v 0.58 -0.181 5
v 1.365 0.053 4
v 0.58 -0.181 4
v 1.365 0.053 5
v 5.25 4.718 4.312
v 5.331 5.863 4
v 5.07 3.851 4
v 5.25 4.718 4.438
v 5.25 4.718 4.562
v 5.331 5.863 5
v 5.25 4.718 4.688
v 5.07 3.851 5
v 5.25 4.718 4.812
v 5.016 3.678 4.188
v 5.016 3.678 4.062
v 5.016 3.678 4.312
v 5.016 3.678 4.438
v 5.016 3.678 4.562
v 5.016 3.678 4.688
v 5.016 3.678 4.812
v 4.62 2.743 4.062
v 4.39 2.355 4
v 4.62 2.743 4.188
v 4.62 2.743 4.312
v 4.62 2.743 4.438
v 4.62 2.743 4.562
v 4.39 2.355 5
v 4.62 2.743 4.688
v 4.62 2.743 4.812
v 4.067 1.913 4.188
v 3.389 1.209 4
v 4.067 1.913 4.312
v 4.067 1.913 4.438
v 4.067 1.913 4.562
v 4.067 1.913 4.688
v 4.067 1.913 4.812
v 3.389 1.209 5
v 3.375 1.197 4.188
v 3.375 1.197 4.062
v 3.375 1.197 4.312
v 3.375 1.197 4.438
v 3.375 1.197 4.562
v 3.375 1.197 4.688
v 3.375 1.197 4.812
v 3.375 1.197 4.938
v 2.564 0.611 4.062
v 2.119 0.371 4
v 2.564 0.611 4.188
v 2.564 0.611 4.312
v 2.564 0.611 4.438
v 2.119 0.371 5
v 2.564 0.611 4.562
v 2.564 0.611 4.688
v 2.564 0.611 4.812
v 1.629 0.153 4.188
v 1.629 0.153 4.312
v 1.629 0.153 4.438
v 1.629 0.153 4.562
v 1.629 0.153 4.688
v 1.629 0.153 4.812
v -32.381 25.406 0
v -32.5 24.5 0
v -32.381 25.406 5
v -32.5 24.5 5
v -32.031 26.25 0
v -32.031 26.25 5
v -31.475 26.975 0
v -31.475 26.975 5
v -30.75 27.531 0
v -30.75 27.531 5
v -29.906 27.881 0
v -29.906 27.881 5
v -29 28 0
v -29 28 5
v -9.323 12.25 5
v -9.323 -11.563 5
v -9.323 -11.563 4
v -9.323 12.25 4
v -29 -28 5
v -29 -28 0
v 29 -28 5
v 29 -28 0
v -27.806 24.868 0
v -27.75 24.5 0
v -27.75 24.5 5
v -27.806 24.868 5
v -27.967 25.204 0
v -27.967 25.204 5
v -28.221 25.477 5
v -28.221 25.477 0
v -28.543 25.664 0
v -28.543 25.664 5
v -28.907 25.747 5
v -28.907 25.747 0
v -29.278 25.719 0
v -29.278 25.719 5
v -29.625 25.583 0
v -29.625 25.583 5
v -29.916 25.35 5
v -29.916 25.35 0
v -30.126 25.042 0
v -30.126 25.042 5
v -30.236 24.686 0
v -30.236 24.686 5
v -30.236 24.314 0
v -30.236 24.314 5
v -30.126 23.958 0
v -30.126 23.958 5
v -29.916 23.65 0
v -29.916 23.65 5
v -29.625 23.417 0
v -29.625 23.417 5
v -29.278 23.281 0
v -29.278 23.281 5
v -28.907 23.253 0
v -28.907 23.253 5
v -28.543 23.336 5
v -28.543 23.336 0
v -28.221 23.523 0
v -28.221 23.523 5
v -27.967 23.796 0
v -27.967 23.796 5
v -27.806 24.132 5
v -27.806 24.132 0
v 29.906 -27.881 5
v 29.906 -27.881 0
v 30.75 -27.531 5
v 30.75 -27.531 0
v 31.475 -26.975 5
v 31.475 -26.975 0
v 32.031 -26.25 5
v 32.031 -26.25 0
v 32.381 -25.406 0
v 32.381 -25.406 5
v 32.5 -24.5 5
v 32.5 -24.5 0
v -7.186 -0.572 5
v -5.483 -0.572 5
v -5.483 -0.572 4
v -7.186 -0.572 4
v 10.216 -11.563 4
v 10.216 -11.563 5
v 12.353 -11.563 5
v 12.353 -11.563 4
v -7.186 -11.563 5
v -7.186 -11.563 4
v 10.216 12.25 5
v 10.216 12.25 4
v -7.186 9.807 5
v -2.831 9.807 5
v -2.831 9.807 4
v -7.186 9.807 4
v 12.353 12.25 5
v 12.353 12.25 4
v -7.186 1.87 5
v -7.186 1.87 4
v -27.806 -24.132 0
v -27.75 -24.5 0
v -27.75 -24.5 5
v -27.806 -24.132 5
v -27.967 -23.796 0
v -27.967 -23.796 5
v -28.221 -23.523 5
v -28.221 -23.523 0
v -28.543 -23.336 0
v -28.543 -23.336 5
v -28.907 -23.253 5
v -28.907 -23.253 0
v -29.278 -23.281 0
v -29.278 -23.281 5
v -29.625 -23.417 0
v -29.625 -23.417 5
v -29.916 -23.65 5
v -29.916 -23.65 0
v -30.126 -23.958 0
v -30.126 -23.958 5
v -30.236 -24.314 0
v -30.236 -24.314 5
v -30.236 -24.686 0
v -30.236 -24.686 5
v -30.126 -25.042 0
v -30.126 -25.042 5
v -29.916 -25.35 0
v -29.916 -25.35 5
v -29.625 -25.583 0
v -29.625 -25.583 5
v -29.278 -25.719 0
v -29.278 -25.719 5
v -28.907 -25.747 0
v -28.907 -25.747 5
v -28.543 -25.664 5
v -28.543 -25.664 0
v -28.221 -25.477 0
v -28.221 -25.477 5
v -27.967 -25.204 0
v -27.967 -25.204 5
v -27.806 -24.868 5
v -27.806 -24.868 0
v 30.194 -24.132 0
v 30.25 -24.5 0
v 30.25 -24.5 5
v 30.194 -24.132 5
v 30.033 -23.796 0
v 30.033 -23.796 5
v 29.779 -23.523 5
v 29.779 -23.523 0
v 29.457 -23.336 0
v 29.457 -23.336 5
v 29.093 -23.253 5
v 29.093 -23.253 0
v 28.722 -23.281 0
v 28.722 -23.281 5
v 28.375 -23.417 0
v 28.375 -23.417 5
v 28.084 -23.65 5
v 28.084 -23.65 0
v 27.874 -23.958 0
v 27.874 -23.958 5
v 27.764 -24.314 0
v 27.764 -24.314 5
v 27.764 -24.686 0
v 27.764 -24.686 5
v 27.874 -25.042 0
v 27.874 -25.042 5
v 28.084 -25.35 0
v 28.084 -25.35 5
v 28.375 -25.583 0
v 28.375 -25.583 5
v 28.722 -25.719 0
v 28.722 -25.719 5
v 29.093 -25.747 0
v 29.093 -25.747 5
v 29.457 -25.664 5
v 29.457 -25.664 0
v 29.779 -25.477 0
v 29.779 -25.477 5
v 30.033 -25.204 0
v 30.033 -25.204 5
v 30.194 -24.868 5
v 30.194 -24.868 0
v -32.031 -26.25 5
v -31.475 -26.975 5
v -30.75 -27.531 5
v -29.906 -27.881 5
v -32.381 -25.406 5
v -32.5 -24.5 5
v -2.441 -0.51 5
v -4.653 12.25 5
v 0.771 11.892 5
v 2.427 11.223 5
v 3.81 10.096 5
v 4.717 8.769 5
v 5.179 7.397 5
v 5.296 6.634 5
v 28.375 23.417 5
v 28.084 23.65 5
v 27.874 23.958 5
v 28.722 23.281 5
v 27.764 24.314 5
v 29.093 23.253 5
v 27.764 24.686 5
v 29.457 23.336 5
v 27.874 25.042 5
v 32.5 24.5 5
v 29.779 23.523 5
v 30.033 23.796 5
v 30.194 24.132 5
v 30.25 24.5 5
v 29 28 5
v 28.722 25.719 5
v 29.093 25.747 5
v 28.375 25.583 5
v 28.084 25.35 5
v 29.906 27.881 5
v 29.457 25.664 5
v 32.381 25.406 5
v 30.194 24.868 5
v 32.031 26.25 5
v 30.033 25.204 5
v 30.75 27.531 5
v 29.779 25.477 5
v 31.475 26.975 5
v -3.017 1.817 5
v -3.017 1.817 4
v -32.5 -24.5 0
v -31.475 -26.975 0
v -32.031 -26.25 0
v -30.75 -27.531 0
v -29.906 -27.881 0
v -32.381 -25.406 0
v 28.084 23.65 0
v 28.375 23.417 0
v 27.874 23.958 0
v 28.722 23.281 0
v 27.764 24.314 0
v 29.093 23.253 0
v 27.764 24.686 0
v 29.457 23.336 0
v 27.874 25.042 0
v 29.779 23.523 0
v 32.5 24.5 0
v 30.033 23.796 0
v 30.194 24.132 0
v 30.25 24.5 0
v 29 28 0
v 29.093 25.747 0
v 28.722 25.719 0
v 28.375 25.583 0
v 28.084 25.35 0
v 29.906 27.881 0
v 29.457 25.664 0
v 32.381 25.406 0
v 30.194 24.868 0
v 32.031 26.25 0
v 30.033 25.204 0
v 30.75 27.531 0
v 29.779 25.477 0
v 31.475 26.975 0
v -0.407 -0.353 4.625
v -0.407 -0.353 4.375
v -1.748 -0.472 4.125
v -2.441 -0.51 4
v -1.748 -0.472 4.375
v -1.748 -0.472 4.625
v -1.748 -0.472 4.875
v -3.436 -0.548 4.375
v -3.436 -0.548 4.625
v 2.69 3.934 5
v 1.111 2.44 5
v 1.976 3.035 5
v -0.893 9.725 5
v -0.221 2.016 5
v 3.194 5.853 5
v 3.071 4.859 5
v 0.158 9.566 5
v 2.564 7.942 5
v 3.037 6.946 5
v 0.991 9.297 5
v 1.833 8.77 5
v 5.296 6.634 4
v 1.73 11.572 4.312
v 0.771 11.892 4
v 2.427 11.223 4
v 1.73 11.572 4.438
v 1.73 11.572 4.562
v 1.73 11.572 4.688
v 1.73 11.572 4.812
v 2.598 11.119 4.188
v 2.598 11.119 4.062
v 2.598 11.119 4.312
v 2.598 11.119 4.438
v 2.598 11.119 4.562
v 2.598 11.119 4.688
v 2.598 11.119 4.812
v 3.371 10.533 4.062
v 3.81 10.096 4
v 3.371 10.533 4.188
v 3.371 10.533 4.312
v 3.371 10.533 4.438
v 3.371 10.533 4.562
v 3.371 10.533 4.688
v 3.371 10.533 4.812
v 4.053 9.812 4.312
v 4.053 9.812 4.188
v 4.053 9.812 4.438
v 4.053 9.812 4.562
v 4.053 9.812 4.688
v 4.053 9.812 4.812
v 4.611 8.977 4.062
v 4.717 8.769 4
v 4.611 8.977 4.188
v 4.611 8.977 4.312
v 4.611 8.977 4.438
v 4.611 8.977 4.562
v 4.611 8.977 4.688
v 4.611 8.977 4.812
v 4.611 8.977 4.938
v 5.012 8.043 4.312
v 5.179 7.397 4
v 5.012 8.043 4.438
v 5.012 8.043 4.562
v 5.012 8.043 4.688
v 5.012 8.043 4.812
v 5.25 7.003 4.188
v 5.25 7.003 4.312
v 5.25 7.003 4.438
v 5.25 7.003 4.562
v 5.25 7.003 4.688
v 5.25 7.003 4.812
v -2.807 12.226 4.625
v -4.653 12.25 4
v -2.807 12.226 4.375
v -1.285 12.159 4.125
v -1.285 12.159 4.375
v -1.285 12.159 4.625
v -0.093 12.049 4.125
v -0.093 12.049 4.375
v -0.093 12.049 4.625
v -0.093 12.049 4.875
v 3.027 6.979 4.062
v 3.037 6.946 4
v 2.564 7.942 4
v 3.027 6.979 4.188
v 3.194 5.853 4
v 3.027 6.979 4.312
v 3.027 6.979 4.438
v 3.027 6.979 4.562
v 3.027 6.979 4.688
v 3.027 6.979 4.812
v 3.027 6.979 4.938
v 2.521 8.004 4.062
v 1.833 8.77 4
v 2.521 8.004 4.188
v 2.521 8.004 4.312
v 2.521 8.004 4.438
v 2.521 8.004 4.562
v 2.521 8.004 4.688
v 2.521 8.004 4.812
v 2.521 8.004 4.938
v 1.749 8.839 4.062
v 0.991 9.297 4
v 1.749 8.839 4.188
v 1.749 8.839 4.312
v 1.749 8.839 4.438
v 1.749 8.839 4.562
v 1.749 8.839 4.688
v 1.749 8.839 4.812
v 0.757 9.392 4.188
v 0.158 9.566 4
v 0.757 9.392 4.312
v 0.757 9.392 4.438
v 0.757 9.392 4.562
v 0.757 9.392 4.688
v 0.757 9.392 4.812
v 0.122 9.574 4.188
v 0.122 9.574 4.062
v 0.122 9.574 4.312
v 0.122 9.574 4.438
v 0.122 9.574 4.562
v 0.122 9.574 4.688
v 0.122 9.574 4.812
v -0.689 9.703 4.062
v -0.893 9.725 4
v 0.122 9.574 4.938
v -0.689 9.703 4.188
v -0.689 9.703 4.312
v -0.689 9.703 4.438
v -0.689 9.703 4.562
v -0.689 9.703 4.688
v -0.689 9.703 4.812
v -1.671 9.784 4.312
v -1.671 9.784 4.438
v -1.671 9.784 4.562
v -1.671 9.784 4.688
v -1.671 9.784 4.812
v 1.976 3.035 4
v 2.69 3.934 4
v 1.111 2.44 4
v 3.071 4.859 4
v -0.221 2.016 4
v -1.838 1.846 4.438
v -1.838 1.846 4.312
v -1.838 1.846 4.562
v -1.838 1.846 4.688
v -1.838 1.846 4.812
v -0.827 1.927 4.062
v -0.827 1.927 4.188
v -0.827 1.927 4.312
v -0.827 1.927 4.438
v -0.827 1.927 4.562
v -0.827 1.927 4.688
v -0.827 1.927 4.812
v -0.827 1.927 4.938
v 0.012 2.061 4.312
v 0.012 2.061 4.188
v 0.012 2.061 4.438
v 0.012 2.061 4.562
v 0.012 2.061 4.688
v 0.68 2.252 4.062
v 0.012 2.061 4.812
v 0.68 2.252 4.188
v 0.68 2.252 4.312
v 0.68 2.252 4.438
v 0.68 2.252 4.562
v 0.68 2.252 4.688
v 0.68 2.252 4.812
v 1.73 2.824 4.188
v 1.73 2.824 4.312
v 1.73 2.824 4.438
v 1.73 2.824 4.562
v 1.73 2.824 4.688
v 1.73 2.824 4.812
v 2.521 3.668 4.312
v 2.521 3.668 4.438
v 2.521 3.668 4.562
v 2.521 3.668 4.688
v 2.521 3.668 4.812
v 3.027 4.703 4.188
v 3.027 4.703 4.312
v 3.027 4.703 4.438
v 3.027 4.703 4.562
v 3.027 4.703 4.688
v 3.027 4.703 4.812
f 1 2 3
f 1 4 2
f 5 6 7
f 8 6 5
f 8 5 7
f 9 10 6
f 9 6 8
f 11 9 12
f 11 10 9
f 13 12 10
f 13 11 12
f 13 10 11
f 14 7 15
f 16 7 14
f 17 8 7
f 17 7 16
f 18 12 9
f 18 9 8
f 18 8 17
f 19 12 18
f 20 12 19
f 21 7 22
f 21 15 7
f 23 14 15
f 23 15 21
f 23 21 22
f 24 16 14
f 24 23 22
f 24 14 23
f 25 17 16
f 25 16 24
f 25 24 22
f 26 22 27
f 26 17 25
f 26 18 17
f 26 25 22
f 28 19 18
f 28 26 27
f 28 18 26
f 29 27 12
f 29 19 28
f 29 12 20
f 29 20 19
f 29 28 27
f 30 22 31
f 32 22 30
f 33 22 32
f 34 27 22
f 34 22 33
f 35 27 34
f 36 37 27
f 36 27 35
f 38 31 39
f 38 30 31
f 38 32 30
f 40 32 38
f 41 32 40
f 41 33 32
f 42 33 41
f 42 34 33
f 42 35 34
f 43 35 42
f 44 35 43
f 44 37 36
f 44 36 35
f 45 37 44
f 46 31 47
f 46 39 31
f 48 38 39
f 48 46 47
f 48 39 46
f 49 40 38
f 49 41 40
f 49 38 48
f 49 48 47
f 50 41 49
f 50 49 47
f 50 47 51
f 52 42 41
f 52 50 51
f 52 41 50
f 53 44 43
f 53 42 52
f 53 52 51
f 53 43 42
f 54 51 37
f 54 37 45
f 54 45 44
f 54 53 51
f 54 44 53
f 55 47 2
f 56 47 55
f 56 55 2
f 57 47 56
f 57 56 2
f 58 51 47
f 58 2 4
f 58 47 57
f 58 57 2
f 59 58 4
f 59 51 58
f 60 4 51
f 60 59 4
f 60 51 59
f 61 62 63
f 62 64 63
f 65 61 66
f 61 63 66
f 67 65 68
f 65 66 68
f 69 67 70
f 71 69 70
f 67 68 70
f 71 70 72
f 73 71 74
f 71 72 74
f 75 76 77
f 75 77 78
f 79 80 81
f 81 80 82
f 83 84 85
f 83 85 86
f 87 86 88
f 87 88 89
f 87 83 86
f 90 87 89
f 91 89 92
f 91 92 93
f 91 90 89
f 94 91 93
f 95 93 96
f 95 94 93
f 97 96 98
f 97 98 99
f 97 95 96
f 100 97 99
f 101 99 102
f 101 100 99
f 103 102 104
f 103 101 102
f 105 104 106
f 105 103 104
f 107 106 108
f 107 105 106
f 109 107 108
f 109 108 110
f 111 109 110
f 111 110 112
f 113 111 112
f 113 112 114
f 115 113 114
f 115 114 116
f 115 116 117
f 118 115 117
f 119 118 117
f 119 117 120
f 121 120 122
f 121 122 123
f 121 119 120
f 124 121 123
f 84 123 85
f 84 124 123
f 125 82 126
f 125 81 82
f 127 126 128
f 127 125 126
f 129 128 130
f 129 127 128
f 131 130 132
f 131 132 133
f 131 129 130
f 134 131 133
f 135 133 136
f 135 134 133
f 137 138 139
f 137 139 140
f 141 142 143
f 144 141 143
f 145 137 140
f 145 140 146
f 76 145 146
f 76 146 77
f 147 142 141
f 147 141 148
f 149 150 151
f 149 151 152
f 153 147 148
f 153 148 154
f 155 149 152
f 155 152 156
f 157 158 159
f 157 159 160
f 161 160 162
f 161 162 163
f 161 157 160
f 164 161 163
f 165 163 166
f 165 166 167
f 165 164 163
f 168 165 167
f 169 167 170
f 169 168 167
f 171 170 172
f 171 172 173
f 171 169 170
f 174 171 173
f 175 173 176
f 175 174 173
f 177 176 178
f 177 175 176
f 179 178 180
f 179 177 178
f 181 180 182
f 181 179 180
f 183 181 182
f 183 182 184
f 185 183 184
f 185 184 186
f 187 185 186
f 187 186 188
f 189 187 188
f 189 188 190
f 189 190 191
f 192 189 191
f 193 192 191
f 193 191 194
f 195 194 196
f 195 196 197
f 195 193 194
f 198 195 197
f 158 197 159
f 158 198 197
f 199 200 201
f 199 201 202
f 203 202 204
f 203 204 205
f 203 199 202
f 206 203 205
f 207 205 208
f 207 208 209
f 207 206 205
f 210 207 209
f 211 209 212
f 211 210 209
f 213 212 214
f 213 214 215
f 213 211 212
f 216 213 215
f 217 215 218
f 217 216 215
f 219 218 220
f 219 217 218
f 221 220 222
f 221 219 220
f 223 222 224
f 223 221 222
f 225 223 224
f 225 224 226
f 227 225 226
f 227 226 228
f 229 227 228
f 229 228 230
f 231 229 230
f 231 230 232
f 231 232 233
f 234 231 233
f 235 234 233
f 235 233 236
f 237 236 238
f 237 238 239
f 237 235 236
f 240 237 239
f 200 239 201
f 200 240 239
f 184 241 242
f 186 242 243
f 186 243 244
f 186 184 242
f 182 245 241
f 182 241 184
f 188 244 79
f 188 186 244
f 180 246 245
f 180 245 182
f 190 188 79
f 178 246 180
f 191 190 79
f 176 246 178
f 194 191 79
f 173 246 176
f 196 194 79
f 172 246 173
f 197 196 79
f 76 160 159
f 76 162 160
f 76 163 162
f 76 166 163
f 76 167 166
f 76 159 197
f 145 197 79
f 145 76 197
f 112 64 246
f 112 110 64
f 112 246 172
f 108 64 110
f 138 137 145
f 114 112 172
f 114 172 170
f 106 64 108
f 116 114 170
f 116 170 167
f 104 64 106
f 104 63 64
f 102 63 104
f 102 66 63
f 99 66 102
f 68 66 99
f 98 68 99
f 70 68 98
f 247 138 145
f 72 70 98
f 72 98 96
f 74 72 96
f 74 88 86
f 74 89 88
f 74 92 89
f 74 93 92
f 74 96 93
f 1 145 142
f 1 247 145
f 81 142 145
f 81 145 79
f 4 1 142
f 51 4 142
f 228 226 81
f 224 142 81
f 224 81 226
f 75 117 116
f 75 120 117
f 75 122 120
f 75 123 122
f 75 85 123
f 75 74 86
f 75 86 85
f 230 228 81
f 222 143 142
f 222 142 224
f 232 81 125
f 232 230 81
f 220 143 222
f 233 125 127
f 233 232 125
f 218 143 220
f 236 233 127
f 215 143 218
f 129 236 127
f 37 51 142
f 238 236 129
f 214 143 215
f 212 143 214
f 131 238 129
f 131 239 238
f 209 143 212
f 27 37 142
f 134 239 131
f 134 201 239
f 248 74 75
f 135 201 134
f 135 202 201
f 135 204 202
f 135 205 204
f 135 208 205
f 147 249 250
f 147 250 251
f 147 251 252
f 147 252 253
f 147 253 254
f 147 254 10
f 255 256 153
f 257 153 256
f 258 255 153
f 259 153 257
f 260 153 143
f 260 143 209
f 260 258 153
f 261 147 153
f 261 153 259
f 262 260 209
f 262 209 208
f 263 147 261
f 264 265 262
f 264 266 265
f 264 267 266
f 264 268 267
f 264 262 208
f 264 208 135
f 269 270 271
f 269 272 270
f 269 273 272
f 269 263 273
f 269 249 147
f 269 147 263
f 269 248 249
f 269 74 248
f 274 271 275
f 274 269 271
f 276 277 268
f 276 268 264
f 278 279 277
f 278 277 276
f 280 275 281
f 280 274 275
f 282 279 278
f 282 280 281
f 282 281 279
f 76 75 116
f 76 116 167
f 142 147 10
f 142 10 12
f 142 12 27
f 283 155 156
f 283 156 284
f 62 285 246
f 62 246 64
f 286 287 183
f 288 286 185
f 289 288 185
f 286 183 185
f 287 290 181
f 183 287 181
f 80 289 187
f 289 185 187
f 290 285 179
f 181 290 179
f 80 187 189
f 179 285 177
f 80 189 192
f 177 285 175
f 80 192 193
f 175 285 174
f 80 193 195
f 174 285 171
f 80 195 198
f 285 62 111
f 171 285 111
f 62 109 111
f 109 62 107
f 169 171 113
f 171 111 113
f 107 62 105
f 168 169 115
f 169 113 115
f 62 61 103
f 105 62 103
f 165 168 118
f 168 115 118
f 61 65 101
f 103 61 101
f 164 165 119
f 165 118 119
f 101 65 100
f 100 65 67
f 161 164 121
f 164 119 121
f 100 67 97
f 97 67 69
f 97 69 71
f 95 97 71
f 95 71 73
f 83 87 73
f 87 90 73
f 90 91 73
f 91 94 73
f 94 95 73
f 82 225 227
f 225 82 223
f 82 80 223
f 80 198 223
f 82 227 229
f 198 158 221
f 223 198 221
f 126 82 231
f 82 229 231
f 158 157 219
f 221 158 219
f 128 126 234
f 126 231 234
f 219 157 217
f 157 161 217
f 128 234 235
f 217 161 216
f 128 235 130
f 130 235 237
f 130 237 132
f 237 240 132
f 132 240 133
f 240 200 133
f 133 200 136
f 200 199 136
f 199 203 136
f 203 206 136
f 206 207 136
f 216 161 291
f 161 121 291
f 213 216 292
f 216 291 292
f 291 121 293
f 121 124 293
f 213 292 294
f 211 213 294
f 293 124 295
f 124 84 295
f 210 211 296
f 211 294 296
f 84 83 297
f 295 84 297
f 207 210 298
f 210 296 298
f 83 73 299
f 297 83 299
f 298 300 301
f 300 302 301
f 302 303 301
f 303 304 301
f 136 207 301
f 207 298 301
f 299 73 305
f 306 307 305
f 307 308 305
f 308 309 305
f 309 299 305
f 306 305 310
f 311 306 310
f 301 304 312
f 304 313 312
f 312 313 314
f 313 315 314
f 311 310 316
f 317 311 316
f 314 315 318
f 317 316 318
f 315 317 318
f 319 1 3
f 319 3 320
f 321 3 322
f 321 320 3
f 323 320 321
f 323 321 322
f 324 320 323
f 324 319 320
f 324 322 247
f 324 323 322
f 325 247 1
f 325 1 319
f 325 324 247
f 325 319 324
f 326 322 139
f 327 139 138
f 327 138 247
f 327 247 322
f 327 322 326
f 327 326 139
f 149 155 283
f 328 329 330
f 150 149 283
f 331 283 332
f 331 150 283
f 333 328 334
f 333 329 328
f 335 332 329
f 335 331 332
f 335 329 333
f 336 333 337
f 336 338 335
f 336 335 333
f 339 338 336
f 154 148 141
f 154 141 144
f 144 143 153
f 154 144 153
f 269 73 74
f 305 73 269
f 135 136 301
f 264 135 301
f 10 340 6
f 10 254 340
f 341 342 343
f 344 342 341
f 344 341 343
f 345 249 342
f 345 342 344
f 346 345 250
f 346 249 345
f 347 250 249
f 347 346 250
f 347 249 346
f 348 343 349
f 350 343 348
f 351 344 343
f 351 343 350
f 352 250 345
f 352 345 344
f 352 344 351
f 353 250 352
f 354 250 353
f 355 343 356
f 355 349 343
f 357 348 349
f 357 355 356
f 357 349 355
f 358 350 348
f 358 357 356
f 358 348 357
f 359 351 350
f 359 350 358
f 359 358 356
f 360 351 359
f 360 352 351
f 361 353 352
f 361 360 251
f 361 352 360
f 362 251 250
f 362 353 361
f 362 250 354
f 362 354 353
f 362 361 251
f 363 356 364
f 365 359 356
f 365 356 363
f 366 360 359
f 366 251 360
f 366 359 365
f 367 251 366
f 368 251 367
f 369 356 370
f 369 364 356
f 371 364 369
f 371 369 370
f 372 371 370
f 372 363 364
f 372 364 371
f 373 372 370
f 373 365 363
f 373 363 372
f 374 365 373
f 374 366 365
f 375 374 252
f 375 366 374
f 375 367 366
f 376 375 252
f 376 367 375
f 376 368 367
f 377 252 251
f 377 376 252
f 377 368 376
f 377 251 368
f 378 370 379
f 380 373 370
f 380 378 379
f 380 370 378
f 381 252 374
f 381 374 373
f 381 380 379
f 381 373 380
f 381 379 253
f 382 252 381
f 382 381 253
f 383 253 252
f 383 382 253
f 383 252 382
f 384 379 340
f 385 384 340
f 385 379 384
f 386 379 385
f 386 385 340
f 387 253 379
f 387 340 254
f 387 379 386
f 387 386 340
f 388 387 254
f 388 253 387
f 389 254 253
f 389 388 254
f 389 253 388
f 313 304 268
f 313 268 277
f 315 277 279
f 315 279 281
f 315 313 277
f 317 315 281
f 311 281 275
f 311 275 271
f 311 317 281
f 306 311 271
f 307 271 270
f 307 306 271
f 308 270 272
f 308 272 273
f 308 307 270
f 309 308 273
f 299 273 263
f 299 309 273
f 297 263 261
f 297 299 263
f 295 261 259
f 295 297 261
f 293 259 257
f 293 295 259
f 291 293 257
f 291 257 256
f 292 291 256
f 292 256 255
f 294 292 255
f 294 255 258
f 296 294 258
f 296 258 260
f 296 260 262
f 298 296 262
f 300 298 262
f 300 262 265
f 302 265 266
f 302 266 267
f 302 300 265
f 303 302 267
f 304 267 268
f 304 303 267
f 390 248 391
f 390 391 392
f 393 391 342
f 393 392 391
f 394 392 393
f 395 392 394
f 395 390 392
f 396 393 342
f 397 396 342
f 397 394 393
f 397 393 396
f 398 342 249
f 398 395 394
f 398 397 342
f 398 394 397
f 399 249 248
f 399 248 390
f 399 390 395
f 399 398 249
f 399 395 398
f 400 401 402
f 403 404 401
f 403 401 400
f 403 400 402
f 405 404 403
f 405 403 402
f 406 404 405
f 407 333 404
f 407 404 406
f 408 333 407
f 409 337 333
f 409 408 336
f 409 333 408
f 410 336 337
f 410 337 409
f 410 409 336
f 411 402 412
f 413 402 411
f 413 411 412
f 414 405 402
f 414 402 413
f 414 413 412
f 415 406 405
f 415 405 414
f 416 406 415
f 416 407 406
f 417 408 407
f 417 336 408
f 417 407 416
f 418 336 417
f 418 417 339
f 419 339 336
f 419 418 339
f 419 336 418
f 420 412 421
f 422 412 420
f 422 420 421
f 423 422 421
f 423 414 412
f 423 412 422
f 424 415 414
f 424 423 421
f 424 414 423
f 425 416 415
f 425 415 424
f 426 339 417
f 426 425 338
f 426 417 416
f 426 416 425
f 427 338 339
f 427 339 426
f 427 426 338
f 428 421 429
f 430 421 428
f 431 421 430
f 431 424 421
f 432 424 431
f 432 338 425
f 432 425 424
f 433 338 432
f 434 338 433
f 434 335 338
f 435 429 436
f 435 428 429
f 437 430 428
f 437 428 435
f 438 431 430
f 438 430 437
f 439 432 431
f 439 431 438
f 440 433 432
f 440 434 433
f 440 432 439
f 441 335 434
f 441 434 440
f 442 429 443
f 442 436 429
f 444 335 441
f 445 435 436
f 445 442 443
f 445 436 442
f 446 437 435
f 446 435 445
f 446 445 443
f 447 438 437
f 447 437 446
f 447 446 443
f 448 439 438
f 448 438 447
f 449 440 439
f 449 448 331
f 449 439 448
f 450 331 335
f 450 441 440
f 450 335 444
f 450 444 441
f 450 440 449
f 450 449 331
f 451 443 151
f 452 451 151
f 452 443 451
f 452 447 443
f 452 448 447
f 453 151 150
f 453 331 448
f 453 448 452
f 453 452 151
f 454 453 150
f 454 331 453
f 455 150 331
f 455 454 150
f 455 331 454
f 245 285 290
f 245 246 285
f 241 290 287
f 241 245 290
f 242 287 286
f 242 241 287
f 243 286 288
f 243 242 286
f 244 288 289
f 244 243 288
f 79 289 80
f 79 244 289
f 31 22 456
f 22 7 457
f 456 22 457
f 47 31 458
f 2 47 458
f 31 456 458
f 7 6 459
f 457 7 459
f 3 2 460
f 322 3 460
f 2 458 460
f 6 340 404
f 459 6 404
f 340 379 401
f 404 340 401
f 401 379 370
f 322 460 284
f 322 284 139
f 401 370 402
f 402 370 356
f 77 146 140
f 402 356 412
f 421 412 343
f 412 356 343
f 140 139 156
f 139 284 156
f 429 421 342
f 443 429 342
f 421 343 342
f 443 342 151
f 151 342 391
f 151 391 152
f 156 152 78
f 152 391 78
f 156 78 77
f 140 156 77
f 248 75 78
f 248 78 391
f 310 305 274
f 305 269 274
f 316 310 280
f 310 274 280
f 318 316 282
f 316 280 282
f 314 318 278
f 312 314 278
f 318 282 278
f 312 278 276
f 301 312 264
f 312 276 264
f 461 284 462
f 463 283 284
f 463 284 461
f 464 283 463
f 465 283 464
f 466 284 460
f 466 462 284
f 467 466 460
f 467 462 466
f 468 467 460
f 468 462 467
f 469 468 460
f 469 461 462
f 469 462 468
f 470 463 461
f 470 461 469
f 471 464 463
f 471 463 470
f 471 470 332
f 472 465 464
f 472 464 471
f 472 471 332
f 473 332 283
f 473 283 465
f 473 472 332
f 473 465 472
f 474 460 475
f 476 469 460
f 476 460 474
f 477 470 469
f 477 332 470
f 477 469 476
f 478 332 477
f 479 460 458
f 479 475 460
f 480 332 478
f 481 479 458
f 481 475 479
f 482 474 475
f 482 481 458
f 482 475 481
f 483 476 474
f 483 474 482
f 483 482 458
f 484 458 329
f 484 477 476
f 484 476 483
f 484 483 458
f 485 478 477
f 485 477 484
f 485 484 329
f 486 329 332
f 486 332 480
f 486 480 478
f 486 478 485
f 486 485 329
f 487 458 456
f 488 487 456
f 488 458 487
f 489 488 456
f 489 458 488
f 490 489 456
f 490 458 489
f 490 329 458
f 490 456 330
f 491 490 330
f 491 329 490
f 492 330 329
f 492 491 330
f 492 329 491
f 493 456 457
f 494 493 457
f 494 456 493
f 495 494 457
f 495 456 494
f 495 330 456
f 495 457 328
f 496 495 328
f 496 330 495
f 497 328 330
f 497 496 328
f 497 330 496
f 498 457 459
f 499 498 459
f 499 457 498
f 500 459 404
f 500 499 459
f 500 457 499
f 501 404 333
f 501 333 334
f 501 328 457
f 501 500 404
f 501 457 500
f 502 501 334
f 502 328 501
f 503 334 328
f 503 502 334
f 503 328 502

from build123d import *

# Parameters (mm, degrees)
BOSS_EXTRU_1_OUTLINE_W  = 65
BOSS_EXTRU_1_OUTLINE_H  = 56
BOSS_EXTRU_1_OUTLINE_R  = 1.25
BOSS_EXTRU_1_DEPTH      = 5
CONG_3_R                = 3.5
ESQUISSE2_W             = 2.137019231
ESQUISSE2_H             = 23.8125
ENL_V_MAT_EXTRU_1_DEPTH = 1


# Read off the part's stored shape, not the designer's step: Boss.-Extru.1
with BuildPart() as part:
    # Boss.-Extru.1 outline → Boss.-Extru.1 (new body)
    with BuildSketch(Plane.XY):
        Rectangle(BOSS_EXTRU_1_OUTLINE_W, BOSS_EXTRU_1_OUTLINE_H)
        with Locations((-29, -24.5)):
            Circle(BOSS_EXTRU_1_OUTLINE_R, mode=Mode.SUBTRACT)
        with Locations((29, -24.5)):
            Circle(BOSS_EXTRU_1_OUTLINE_R, mode=Mode.SUBTRACT)
        with Locations((-29, 24.5)):
            Circle(BOSS_EXTRU_1_OUTLINE_R, mode=Mode.SUBTRACT)
        with Locations((29, 24.5)):
            Circle(BOSS_EXTRU_1_OUTLINE_R, mode=Mode.SUBTRACT)
    extrude(amount=BOSS_EXTRU_1_DEPTH)

    # Congé3
    cong_3_edges = [part.edges().sort_by_distance(p)[0] for p in [
        (-32.5, 28, 2.5),
        (32.5, 28, 2.5),
        (32.5, -28, 2.5),
        (-32.5, -28, 2.5),
    ]]
    fillet(cong_3_edges, radius=CONG_3_R)

    # Esquisse2 → Enlèv. mat.-Extru.1 (cut)
    # profile 1 of 2: a face of its own
    with BuildSketch(Plane.XY.offset(5)):
        with BuildLine():
            Line((-9.322744099, 12.249768252), (-4.652784664, 12.249768252))
            add(Edge.make_bspline(
                [(-4.652784664, 12.249768252), (-4.331581892, 12.249415172), (-3.716143116, 12.248738655), (-2.833617469, 12.228227617), (-2.032090545, 12.20083173), (-1.313290632, 12.16285492), (-0.675006107, 12.117974548), (-0.120125194, 12.055027637), (0.355713573, 11.989303126), (0.640827095, 11.922482485), (0.77085566, 11.892008336)],
                knots=[0, 0, 0, 0, 1.415646017, 2.712440637, 3.8905458, 4.950247383, 5.884950622, 6.709939814, 7.411656543, 8, 8, 8, 8], degree=3))
            add(Edge.make_bspline(
                [(0.77085566, 11.892008336), (0.935458095, 11.846955427), (1.260784315, 11.757911225), (1.729557484, 11.579564285), (2.175557754, 11.368094554), (2.600315321, 11.127085249), (2.998610565, 10.846195964), (3.376385951, 10.536812958), (3.730307602, 10.191793179), (4.058385286, 9.815006359), (4.35968007, 9.412777789), (4.61909809, 8.979102974), (4.83631726, 8.521281785), (5.022621303, 8.039632667), (5.156709181, 7.530111002), (5.257721123, 6.996257119), (5.321835447, 6.438128245), (5.32797609, 6.056720932), (5.331102055, 5.86256122)],
                knots=[0, 0, 0, 0, 0.999701418, 1.975846123, 2.934577507, 3.890451536, 4.834027766, 5.787354733, 6.749476667, 7.726910423, 8.712836071, 9.690891519, 10.682875813, 11.679750201, 12.712814741, 13.765529915, 14.8625177, 16, 16, 16, 16], degree=3))
            add(Edge.make_bspline(
                [(5.331102055, 5.86256122), (5.328234861, 5.66676956), (5.322625004, 5.283689954), (5.25529492, 4.723260806), (5.164602009, 4.187694616), (5.025148849, 3.67817889), (4.842502395, 3.197739452), (4.628243964, 2.739034284), (4.369820302, 2.309867231), (4.072879586, 1.908680234), (3.742555345, 1.535096724), (3.380245177, 1.191823926), (2.987411776, 0.880871195), (2.56530359, 0.601541428), (2.109805511, 0.360312098), (1.627825859, 0.144249005), (1.11517528, -0.037209461), (0.760419961, -0.132663986), (0.580050372, -0.181196292)],
                knots=[0, 0, 0, 0, 1.121902311, 2.195077645, 3.232258892, 4.234102512, 5.217864754, 6.176164875, 7.132989551, 8.084763148, 9.034132444, 9.988522005, 10.94243251, 11.903244335, 12.886203696, 13.894208494, 14.929344452, 16, 16, 16, 16], degree=3))
            add(Edge.make_bspline(
                [(0.580050372, -0.181196292), (0.430866189, -0.212921216), (0.103920378, -0.282448234), (-0.434532786, -0.360066485), (-1.061450501, -0.426316947), (-1.775977084, -0.475990758), (-2.577471169, -0.518515586), (-3.466366331, -0.552316368), (-4.444407463, -0.570889123), (-5.126610034, -0.571847017), (-5.482787669, -0.572347133)],
                knots=[0, 0, 0, 0, 0.601384939, 1.31797006, 2.144135048, 3.087295005, 4.142315834, 5.309527816, 6.595305764, 8, 8, 8, 8], degree=3))
            Line((-5.482787669, -0.572347133), (-7.185724869, -0.572347133))
            Line((-7.185724869, -0.572347133), (-7.185724869, -11.562731748))
            Line((-7.185724869, -11.562731748), (-9.322744099, -11.562731748))
            Line((-9.322744099, -11.562731748), (-9.322744099, 12.249768252))
        make_face()
        with BuildLine():
            Line((-7.185724869, 9.807460559), (-7.185724869, 1.869960559))
            Line((-7.185724869, 1.869960559), (-3.016629316, 1.817489105))
            add(Edge.make_bspline(
                [(-3.016629316, 1.817489105), (-2.813066963, 1.817383897), (-2.420094039, 1.817180796), (-1.852429734, 1.844294549), (-1.325770119, 1.875594601), (-0.841732919, 1.921422938), (-0.400099936, 1.986201493), (-0.000134784, 2.051595639), (0.355061194, 2.146201766), (0.770753978, 2.273585505), (1.233963895, 2.490841336), (1.737887752, 2.806186124), (2.16495192, 3.208145942), (2.534510332, 3.660092437), (2.827784252, 4.162870443), (3.042477699, 4.700821602), (3.168623788, 5.268428935), (3.185538784, 5.656832166), (3.194082824, 5.853020956)],
                knots=[0, 0, 0, 0, 1.160613943, 2.240541288, 3.23993089, 4.169200891, 5.011653406, 5.7853311, 6.478053781, 7.106038997, 8.262395093, 9.384106736, 10.481365981, 11.59014053, 12.70357646, 13.786202915, 14.881775077, 16, 16, 16, 16], degree=3))
            add(Edge.make_bspline(
                [(3.194082824, 5.853020956), (3.185492318, 6.044463342), (3.168415456, 6.425027112), (3.041488959, 6.982775465), (2.828201662, 7.515057668), (2.532541618, 8.011535267), (2.173713573, 8.461855522), (1.756659113, 8.853041333), (1.28235996, 9.167513989), (0.841160389, 9.370486852), (0.449266605, 9.49441578), (0.108870592, 9.581126212), (-0.275467747, 9.650356676), (-0.703873532, 9.706414722), (-1.173026277, 9.754403449), (-1.686956598, 9.786965187), (-2.243717635, 9.806025094), (-2.630232412, 9.806970487), (-2.830594159, 9.807460559)],
                knots=[0, 0, 0, 0, 1.120700087, 2.227813068, 3.331159281, 4.466773991, 5.599788987, 6.693661531, 7.80175334, 8.91857717, 9.525282508, 10.207424825, 10.974604443, 11.810962634, 12.737642355, 13.736264703, 14.826523623, 16, 16, 16, 16], degree=3))
            Line((-2.830594159, 9.807460559), (-7.185724869, 9.807460559))
        make_face(mode=Mode.SUBTRACT)
    # profile 2 of 2: a face of its own
    with BuildSketch(Plane.XY.offset(5)):
        with Locations((11.284227055, 0.343518252)):
            Rectangle(ESQUISSE2_W, ESQUISSE2_H)
    extrude(amount=-ENL_V_MAT_EXTRU_1_DEPTH, mode=Mode.SUBTRACT)


solid = part.part
